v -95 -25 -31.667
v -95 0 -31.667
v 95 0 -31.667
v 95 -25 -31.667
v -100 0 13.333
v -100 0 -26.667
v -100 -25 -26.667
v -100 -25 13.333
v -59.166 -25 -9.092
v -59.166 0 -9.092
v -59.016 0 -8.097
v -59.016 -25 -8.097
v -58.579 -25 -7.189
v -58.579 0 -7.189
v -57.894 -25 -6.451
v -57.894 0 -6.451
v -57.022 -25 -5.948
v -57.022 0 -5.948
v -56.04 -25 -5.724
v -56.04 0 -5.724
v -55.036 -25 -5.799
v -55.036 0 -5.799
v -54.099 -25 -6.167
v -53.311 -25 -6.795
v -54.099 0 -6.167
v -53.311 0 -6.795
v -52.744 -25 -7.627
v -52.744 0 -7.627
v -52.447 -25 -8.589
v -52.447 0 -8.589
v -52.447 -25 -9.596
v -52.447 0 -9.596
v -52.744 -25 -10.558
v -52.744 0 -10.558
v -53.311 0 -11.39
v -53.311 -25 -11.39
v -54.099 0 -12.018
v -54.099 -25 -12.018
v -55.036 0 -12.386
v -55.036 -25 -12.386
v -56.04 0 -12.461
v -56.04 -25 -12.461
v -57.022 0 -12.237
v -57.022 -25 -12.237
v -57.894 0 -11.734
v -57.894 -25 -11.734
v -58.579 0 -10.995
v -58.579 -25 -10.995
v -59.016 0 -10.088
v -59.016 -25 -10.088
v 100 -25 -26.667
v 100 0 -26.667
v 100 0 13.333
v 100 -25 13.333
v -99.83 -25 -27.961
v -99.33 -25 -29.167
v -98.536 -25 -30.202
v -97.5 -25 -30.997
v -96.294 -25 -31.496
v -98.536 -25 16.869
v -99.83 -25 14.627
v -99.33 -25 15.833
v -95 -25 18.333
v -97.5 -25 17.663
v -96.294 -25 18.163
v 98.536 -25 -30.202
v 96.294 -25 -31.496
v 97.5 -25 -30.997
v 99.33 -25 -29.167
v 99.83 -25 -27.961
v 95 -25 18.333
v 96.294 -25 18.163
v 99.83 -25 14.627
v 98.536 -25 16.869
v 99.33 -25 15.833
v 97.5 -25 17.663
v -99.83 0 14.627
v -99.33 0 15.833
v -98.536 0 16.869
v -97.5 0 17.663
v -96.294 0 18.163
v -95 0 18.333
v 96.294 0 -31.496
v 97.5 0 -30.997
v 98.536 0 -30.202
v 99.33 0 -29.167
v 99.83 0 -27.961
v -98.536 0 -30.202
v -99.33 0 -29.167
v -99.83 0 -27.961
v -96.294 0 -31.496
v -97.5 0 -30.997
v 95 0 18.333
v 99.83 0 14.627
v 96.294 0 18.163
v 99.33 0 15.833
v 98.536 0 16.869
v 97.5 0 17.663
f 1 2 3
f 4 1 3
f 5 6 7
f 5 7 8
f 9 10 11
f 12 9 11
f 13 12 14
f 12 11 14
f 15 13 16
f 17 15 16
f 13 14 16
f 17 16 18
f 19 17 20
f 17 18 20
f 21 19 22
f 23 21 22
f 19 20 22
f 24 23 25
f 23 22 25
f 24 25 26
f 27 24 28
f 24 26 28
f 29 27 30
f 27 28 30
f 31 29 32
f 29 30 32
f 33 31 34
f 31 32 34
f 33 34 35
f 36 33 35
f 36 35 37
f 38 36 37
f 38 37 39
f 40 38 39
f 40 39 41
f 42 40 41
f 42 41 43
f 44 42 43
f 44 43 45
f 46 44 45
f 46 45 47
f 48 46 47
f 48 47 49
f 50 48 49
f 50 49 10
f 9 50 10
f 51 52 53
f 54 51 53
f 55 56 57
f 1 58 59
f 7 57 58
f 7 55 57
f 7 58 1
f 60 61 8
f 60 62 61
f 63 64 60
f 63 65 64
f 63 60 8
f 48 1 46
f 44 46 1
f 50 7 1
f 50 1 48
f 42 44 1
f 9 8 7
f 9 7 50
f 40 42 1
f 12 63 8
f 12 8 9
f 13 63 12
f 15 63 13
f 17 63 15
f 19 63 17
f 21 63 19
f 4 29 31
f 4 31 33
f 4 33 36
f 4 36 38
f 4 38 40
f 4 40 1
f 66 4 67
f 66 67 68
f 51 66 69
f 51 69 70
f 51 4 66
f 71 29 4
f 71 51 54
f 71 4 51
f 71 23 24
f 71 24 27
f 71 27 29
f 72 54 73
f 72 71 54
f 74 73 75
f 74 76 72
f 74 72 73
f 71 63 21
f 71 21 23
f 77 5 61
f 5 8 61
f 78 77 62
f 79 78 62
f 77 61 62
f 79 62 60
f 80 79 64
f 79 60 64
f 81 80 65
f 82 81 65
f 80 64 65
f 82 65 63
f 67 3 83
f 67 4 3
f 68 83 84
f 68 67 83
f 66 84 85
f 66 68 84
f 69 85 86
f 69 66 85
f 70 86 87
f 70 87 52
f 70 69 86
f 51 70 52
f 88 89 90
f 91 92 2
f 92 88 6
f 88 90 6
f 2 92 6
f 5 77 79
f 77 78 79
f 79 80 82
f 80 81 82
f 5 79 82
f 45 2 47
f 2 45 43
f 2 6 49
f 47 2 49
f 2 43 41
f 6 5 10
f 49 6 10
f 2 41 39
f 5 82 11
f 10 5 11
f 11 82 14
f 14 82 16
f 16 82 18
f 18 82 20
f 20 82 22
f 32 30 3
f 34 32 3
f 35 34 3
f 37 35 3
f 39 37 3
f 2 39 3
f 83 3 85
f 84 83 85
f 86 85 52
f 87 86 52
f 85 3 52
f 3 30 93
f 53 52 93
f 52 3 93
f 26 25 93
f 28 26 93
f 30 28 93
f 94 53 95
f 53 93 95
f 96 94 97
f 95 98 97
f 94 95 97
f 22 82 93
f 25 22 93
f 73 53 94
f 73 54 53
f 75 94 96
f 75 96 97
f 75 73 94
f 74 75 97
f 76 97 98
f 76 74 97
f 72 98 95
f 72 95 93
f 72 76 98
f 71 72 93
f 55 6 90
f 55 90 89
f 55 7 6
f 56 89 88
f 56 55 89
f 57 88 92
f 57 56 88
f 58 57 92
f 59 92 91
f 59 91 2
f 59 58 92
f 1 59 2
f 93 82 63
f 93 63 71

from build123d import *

# Parameters (mm, degrees)
F0_W     = 200
F0_H     = 50
F1_DEPTH = 25
F2_R     = 5
F5_D     = 6.7564


with BuildPart() as f1:
    # F0 (on Front) → F1 (new body)
    with BuildSketch(Plane.XZ):
        with Locations((0, -6.6666597634)):
            Rectangle(F0_W, F0_H)
    extrude(amount=F1_DEPTH)

    # F2
    f2_edges = [f1.edges().sort_by_distance(p)[0] for p in [
        (-100, -12.5, 18.33334),
        (100, -12.5, 18.33334),
        (100, -12.5, -31.66666),
        (-100, -12.5, -31.66666),
    ]]
    fillet(f2_edges, radius=F2_R)

    # F5 (through all)
    with Locations(Plane.XZ.offset(25)):
        with Locations((-55.7876750827, -9.0924659744)):
            Hole(F5_D / 2)


solid = f1.part
